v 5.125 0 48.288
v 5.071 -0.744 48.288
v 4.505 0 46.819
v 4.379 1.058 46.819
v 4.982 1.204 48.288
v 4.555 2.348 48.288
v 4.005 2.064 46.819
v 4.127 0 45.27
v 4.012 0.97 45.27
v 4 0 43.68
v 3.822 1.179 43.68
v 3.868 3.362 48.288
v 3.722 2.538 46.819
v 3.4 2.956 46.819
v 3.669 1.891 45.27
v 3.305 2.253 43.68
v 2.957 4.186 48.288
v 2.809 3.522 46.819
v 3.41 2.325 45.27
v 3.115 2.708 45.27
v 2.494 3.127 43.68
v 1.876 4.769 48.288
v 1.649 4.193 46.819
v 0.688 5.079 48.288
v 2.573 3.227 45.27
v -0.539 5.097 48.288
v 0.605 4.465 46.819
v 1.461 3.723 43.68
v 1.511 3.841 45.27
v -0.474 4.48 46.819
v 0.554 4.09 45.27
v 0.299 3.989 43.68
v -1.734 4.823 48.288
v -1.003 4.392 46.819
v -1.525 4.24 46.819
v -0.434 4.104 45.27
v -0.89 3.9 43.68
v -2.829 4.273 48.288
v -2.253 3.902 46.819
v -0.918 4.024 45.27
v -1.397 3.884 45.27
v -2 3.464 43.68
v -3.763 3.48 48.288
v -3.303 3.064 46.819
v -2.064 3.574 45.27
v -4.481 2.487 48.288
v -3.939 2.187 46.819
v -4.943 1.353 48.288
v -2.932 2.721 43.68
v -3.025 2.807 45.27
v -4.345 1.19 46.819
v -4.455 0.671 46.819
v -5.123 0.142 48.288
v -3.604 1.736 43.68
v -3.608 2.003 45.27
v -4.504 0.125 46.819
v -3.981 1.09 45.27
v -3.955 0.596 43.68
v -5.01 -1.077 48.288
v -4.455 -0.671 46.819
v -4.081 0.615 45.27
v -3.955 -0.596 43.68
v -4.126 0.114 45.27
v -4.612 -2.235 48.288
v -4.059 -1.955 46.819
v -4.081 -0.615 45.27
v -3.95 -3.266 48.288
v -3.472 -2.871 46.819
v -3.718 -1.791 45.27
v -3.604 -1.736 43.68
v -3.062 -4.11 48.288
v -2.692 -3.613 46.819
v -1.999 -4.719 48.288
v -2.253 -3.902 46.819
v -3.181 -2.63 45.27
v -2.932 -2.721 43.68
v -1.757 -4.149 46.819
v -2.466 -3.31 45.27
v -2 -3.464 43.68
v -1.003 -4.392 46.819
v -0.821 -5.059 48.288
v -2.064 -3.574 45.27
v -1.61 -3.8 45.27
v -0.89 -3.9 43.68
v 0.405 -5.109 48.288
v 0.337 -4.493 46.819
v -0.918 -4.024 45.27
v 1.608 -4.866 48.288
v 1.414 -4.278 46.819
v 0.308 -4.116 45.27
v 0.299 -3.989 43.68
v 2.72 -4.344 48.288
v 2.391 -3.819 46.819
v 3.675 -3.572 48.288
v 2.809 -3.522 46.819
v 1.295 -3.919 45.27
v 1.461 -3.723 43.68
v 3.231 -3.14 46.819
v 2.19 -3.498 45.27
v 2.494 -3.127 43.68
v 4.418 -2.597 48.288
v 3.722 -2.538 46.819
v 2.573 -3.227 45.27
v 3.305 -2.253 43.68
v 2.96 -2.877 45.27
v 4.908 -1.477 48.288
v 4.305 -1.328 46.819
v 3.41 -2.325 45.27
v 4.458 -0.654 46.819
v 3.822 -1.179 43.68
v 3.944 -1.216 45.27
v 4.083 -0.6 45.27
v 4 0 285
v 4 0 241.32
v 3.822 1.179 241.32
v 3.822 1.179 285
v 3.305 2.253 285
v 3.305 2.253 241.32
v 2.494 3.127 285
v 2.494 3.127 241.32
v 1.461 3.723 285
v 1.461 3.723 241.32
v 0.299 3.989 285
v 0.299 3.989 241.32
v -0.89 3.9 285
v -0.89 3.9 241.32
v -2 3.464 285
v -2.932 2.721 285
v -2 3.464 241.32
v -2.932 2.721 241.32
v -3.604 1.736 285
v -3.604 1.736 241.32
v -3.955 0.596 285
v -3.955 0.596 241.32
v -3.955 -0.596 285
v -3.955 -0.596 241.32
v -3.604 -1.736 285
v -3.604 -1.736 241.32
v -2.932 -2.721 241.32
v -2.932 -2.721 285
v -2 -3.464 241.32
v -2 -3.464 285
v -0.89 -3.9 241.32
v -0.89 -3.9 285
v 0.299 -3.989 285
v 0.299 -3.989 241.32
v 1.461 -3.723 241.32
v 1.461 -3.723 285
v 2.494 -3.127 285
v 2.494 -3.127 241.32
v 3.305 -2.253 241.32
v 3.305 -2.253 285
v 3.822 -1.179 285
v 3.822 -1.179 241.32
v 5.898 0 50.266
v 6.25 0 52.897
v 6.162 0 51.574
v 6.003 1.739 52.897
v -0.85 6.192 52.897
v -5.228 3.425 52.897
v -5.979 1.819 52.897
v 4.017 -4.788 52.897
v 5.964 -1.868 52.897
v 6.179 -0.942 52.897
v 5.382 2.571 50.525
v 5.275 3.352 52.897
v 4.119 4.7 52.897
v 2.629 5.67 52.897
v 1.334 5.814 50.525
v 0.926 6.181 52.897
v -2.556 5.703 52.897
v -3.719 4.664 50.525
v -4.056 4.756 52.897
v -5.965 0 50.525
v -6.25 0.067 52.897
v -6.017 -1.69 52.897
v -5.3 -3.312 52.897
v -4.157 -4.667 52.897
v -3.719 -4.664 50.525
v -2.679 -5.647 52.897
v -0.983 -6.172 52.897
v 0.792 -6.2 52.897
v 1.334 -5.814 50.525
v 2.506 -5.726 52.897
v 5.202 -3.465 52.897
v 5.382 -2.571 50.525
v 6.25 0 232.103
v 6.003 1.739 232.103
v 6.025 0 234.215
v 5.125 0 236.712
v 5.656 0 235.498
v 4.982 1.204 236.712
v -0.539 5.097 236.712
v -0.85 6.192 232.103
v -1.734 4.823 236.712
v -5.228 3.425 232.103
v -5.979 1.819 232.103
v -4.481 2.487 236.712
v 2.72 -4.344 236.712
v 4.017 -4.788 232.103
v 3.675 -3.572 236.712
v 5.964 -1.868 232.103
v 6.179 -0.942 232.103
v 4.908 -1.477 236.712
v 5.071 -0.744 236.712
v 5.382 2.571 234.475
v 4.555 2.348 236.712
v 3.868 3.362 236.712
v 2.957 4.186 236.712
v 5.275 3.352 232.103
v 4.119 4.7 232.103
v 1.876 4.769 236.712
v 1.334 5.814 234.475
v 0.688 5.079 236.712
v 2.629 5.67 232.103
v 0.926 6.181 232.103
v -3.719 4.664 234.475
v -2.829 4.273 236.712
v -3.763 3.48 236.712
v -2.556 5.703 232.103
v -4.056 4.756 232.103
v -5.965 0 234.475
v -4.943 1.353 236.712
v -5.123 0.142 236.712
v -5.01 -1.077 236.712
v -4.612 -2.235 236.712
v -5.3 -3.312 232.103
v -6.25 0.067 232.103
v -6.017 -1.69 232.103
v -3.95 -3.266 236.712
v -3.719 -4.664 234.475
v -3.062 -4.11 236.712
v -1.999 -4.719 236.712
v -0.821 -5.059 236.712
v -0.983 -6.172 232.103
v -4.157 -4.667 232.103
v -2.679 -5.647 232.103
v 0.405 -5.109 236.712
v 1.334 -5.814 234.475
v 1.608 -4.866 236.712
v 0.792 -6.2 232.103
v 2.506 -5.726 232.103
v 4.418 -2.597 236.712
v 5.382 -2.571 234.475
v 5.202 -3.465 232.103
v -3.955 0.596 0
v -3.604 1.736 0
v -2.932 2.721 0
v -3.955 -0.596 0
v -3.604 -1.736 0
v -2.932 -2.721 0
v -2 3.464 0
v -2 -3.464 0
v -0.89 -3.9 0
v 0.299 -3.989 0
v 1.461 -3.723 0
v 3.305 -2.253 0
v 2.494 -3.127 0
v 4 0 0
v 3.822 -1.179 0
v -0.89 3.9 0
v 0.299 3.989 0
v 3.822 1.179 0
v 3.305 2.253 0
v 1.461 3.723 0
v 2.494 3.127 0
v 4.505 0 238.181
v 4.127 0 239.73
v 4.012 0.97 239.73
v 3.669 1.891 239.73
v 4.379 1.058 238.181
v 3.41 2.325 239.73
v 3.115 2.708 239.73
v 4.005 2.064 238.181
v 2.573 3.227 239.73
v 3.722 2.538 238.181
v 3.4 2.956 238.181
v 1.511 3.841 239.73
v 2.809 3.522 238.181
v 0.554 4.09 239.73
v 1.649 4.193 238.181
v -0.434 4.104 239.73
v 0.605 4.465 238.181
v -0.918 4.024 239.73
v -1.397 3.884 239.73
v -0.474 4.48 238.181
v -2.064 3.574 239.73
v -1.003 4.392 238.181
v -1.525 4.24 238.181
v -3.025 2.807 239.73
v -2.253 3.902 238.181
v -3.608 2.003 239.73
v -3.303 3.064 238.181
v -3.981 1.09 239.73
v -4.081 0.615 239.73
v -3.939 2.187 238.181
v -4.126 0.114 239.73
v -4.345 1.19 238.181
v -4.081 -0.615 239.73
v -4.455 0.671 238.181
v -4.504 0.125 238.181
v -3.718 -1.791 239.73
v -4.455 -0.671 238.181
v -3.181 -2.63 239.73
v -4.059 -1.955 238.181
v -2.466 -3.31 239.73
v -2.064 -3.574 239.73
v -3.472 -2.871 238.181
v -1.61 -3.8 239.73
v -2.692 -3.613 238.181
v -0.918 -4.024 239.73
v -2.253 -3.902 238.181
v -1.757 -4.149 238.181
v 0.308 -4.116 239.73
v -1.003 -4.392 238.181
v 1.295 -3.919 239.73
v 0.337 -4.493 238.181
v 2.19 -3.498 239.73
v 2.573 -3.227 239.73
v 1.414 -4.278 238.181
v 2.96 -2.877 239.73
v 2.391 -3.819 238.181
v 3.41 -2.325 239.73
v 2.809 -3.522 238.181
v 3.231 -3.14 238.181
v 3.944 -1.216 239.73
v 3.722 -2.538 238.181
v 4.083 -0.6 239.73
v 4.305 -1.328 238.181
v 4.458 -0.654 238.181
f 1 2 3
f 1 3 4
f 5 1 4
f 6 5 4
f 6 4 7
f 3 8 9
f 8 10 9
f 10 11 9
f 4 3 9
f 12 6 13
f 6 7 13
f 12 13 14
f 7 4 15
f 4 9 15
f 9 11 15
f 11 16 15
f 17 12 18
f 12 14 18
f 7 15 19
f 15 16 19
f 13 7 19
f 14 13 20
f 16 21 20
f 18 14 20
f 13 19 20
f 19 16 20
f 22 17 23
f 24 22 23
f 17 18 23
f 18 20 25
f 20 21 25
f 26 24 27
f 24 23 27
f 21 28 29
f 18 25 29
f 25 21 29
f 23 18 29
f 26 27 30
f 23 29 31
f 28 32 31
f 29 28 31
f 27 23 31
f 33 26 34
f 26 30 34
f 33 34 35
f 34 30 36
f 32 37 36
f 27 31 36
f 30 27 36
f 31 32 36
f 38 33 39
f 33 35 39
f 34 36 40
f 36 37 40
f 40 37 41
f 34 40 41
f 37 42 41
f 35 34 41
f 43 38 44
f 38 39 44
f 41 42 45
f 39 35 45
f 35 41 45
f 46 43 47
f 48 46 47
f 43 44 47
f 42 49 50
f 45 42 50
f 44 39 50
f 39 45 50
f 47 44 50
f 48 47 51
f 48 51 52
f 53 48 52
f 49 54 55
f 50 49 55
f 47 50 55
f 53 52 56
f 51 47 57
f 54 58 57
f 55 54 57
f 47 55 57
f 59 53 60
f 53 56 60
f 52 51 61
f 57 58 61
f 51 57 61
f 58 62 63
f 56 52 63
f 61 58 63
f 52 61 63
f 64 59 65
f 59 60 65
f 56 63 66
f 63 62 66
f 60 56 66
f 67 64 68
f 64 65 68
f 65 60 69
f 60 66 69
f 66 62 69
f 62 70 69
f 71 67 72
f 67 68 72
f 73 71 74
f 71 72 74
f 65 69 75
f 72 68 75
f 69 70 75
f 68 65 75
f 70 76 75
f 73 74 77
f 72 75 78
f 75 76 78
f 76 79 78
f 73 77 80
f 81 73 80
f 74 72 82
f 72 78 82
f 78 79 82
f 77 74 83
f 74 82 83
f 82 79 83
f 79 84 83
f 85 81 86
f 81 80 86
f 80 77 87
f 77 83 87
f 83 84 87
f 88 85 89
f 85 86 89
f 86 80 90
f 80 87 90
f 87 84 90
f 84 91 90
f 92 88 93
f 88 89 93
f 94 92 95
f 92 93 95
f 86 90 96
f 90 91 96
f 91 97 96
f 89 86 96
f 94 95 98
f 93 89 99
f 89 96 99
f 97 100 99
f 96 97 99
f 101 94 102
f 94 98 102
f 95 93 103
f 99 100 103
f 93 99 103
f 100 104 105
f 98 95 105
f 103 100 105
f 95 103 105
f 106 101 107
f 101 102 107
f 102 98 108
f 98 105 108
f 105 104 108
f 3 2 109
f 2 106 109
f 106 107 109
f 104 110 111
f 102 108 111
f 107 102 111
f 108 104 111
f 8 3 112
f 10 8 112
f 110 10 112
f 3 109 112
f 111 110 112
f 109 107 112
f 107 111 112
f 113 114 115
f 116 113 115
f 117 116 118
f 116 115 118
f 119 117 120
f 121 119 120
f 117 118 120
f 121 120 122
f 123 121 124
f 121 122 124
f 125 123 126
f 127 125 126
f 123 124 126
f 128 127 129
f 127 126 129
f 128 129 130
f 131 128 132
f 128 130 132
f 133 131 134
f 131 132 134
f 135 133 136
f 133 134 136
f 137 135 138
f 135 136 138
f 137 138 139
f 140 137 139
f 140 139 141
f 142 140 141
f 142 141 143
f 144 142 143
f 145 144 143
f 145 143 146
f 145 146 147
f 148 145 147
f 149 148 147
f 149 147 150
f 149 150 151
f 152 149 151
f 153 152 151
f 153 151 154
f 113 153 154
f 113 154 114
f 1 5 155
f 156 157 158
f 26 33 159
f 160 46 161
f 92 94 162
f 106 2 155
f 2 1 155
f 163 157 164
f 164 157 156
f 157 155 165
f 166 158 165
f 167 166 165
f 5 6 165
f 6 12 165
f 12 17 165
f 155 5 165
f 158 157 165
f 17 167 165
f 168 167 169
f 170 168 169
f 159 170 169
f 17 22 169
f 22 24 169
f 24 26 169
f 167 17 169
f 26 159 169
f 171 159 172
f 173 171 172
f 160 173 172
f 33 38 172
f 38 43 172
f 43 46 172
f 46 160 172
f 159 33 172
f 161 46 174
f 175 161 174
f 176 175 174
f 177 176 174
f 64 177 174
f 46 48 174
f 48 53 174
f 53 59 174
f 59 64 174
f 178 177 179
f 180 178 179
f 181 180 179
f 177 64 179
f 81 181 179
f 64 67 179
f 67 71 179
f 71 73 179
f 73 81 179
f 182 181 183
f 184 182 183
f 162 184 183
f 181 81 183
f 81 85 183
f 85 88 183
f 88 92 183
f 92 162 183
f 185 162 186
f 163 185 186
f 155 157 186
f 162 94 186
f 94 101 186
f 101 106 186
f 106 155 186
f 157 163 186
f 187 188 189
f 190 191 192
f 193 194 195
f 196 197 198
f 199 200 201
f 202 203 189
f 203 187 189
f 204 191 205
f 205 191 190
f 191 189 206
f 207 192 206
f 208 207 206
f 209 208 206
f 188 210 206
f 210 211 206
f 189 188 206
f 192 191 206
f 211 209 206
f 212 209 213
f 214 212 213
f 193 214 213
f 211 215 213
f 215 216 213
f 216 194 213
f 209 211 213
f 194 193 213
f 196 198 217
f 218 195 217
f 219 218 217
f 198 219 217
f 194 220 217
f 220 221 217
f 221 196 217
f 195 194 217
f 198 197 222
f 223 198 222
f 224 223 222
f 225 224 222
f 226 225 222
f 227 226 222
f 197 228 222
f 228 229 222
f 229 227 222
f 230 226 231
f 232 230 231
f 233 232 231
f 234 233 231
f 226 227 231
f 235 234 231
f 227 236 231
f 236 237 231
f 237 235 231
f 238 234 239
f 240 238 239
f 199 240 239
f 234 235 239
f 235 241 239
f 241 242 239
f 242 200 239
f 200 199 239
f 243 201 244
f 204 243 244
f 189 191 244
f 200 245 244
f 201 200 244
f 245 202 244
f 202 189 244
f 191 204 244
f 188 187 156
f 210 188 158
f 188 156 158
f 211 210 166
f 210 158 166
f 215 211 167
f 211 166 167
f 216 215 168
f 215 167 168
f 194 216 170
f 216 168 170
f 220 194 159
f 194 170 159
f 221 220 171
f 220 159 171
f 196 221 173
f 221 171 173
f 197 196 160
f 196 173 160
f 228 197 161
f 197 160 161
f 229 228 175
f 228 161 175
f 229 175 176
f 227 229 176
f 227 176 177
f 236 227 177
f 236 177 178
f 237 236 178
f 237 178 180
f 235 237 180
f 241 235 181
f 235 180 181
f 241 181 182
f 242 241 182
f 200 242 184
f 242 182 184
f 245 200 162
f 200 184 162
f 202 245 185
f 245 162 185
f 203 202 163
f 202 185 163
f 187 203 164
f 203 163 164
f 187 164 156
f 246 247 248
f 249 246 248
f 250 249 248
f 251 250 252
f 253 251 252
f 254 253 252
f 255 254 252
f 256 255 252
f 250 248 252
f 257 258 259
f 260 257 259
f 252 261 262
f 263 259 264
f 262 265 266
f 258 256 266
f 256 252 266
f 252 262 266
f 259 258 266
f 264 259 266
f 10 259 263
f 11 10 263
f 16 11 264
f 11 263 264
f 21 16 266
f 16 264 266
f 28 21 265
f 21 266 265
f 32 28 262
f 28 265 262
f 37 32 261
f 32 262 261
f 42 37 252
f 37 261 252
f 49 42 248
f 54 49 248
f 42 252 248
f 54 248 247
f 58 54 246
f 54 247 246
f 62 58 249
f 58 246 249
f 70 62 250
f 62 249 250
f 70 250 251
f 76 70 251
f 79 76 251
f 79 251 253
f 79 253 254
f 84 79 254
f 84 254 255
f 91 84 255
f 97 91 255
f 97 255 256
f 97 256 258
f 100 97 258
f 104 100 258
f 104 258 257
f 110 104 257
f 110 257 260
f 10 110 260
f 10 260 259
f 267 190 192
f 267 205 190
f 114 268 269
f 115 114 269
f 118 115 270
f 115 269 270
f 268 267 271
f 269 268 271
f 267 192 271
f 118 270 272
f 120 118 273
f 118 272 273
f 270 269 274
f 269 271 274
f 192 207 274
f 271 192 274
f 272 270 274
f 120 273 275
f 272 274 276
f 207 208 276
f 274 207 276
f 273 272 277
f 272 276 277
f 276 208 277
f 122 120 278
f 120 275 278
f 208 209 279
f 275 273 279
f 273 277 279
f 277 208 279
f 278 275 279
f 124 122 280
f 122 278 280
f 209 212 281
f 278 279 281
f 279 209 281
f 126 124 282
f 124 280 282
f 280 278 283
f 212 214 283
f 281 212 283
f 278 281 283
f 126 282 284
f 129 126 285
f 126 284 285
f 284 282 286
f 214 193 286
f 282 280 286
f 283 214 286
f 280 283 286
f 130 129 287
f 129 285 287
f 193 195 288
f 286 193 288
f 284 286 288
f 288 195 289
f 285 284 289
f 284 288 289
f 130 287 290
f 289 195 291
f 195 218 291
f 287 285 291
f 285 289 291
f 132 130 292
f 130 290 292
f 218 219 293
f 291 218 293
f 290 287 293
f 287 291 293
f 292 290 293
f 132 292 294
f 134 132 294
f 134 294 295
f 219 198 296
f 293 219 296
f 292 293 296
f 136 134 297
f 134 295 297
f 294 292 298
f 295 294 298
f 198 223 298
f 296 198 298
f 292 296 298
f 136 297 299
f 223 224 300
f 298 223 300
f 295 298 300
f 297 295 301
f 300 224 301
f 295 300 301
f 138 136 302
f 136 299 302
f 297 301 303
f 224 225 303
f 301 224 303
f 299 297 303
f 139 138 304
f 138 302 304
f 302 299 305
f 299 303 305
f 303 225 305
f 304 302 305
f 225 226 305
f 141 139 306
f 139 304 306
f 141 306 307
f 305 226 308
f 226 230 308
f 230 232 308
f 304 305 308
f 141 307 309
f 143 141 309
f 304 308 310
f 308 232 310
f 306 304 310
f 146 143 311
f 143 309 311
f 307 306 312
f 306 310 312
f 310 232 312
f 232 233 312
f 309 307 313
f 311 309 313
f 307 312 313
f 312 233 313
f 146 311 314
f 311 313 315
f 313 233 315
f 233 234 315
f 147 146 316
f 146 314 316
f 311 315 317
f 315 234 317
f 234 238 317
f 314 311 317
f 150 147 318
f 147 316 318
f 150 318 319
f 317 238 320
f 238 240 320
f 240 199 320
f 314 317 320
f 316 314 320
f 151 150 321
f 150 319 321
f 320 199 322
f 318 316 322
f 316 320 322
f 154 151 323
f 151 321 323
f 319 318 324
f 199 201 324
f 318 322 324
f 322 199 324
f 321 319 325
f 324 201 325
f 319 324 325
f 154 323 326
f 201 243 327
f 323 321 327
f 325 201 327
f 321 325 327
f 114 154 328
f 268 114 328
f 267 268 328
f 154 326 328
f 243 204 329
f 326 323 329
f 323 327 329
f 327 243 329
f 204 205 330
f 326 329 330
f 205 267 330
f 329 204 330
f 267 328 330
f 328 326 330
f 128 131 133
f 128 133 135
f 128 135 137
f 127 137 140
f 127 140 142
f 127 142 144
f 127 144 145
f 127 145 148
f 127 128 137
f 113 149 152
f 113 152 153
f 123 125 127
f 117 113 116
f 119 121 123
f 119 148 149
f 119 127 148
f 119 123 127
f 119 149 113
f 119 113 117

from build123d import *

# Parameters (mm, degrees)
SKETCH1_R           = 4
BOSS_EXTRUDE1_DEPTH = 50
SKETCH2_R           = 6.25
BOSS_EXTRUDE2_DEPTH = 185
SKETCH3_R           = 4
BOSS_EXTRUDE3_DEPTH = 50
FILLET1_R           = 10
FILLET2_R           = 10


with BuildPart() as part:
    # Sketch1 → Boss-Extrude1 (new body)
    with BuildSketch(Plane.XY):
        Circle(SKETCH1_R)
    extrude(amount=BOSS_EXTRUDE1_DEPTH)

    # Sketch2 → Boss-Extrude2 (add)
    with BuildSketch(Plane.XY.offset(50)):
        Circle(SKETCH2_R)
    extrude(amount=BOSS_EXTRUDE2_DEPTH)

    # Sketch3 → Boss-Extrude3 (add)
    with BuildSketch(Plane.XY.offset(235)):
        Circle(SKETCH3_R)
    extrude(amount=BOSS_EXTRUDE3_DEPTH)

    # Fillet1
    # the kernel refuses this fillet: 10 mm, written as the material it adds along each edge
    with BuildSketch(Plane(origin=(0, 0, 235), x_dir=(1, 0, 0), z_dir=(0, -1, 0))) as fillet1_piece_1:
        with BuildLine():
            CenterArc((14, 6.31961233), FILLET1_R, 180, 39.194967426)
            Line((4, 6.31961233), (3.8, 6.31961233))
            Line((3.8, 6.31961233), (3.8, 0))
            Line((3.8, 0), (4, -0.2))
            ThreePointArc((4, -0.2), (5.125, -0.2), (6.095, -0.126392247))
            Line((6.095, -0.126392247), (6.25, 0))
        make_face()
    revolve(axis=Axis((0, 0, 235), (0, 0, 1)))
    with BuildSketch(Plane(origin=(0, 0, 50), x_dir=(1, 0, 0), z_dir=(0, -1, 0))) as fillet1_piece_2:
        with BuildLine():
            CenterArc((14, -6.31961233), FILLET1_R, 140.805032574, 39.194967426)
            Line((4, -6.31961233), (3.8, -6.31961233))
            Line((3.8, -6.31961233), (3.8, 0))
            Line((3.8, 0), (4, 0.2))
            ThreePointArc((4, 0.2), (5.125, 0.2), (6.095, 0.126392247))
            Line((6.095, 0.126392247), (6.25, 0))
        make_face()
    revolve(axis=Axis((0, 0, 50), (0, 0, 1)))

    # Fillet2
    fillet2_edges = [part.edges().sort_by_distance(p)[0] for p in [
        (-6.25, 0, 50),
        (-6.25, 0, 235),
    ]]
    fillet(fillet2_edges, radius=FILLET2_R)


solid = part.part
